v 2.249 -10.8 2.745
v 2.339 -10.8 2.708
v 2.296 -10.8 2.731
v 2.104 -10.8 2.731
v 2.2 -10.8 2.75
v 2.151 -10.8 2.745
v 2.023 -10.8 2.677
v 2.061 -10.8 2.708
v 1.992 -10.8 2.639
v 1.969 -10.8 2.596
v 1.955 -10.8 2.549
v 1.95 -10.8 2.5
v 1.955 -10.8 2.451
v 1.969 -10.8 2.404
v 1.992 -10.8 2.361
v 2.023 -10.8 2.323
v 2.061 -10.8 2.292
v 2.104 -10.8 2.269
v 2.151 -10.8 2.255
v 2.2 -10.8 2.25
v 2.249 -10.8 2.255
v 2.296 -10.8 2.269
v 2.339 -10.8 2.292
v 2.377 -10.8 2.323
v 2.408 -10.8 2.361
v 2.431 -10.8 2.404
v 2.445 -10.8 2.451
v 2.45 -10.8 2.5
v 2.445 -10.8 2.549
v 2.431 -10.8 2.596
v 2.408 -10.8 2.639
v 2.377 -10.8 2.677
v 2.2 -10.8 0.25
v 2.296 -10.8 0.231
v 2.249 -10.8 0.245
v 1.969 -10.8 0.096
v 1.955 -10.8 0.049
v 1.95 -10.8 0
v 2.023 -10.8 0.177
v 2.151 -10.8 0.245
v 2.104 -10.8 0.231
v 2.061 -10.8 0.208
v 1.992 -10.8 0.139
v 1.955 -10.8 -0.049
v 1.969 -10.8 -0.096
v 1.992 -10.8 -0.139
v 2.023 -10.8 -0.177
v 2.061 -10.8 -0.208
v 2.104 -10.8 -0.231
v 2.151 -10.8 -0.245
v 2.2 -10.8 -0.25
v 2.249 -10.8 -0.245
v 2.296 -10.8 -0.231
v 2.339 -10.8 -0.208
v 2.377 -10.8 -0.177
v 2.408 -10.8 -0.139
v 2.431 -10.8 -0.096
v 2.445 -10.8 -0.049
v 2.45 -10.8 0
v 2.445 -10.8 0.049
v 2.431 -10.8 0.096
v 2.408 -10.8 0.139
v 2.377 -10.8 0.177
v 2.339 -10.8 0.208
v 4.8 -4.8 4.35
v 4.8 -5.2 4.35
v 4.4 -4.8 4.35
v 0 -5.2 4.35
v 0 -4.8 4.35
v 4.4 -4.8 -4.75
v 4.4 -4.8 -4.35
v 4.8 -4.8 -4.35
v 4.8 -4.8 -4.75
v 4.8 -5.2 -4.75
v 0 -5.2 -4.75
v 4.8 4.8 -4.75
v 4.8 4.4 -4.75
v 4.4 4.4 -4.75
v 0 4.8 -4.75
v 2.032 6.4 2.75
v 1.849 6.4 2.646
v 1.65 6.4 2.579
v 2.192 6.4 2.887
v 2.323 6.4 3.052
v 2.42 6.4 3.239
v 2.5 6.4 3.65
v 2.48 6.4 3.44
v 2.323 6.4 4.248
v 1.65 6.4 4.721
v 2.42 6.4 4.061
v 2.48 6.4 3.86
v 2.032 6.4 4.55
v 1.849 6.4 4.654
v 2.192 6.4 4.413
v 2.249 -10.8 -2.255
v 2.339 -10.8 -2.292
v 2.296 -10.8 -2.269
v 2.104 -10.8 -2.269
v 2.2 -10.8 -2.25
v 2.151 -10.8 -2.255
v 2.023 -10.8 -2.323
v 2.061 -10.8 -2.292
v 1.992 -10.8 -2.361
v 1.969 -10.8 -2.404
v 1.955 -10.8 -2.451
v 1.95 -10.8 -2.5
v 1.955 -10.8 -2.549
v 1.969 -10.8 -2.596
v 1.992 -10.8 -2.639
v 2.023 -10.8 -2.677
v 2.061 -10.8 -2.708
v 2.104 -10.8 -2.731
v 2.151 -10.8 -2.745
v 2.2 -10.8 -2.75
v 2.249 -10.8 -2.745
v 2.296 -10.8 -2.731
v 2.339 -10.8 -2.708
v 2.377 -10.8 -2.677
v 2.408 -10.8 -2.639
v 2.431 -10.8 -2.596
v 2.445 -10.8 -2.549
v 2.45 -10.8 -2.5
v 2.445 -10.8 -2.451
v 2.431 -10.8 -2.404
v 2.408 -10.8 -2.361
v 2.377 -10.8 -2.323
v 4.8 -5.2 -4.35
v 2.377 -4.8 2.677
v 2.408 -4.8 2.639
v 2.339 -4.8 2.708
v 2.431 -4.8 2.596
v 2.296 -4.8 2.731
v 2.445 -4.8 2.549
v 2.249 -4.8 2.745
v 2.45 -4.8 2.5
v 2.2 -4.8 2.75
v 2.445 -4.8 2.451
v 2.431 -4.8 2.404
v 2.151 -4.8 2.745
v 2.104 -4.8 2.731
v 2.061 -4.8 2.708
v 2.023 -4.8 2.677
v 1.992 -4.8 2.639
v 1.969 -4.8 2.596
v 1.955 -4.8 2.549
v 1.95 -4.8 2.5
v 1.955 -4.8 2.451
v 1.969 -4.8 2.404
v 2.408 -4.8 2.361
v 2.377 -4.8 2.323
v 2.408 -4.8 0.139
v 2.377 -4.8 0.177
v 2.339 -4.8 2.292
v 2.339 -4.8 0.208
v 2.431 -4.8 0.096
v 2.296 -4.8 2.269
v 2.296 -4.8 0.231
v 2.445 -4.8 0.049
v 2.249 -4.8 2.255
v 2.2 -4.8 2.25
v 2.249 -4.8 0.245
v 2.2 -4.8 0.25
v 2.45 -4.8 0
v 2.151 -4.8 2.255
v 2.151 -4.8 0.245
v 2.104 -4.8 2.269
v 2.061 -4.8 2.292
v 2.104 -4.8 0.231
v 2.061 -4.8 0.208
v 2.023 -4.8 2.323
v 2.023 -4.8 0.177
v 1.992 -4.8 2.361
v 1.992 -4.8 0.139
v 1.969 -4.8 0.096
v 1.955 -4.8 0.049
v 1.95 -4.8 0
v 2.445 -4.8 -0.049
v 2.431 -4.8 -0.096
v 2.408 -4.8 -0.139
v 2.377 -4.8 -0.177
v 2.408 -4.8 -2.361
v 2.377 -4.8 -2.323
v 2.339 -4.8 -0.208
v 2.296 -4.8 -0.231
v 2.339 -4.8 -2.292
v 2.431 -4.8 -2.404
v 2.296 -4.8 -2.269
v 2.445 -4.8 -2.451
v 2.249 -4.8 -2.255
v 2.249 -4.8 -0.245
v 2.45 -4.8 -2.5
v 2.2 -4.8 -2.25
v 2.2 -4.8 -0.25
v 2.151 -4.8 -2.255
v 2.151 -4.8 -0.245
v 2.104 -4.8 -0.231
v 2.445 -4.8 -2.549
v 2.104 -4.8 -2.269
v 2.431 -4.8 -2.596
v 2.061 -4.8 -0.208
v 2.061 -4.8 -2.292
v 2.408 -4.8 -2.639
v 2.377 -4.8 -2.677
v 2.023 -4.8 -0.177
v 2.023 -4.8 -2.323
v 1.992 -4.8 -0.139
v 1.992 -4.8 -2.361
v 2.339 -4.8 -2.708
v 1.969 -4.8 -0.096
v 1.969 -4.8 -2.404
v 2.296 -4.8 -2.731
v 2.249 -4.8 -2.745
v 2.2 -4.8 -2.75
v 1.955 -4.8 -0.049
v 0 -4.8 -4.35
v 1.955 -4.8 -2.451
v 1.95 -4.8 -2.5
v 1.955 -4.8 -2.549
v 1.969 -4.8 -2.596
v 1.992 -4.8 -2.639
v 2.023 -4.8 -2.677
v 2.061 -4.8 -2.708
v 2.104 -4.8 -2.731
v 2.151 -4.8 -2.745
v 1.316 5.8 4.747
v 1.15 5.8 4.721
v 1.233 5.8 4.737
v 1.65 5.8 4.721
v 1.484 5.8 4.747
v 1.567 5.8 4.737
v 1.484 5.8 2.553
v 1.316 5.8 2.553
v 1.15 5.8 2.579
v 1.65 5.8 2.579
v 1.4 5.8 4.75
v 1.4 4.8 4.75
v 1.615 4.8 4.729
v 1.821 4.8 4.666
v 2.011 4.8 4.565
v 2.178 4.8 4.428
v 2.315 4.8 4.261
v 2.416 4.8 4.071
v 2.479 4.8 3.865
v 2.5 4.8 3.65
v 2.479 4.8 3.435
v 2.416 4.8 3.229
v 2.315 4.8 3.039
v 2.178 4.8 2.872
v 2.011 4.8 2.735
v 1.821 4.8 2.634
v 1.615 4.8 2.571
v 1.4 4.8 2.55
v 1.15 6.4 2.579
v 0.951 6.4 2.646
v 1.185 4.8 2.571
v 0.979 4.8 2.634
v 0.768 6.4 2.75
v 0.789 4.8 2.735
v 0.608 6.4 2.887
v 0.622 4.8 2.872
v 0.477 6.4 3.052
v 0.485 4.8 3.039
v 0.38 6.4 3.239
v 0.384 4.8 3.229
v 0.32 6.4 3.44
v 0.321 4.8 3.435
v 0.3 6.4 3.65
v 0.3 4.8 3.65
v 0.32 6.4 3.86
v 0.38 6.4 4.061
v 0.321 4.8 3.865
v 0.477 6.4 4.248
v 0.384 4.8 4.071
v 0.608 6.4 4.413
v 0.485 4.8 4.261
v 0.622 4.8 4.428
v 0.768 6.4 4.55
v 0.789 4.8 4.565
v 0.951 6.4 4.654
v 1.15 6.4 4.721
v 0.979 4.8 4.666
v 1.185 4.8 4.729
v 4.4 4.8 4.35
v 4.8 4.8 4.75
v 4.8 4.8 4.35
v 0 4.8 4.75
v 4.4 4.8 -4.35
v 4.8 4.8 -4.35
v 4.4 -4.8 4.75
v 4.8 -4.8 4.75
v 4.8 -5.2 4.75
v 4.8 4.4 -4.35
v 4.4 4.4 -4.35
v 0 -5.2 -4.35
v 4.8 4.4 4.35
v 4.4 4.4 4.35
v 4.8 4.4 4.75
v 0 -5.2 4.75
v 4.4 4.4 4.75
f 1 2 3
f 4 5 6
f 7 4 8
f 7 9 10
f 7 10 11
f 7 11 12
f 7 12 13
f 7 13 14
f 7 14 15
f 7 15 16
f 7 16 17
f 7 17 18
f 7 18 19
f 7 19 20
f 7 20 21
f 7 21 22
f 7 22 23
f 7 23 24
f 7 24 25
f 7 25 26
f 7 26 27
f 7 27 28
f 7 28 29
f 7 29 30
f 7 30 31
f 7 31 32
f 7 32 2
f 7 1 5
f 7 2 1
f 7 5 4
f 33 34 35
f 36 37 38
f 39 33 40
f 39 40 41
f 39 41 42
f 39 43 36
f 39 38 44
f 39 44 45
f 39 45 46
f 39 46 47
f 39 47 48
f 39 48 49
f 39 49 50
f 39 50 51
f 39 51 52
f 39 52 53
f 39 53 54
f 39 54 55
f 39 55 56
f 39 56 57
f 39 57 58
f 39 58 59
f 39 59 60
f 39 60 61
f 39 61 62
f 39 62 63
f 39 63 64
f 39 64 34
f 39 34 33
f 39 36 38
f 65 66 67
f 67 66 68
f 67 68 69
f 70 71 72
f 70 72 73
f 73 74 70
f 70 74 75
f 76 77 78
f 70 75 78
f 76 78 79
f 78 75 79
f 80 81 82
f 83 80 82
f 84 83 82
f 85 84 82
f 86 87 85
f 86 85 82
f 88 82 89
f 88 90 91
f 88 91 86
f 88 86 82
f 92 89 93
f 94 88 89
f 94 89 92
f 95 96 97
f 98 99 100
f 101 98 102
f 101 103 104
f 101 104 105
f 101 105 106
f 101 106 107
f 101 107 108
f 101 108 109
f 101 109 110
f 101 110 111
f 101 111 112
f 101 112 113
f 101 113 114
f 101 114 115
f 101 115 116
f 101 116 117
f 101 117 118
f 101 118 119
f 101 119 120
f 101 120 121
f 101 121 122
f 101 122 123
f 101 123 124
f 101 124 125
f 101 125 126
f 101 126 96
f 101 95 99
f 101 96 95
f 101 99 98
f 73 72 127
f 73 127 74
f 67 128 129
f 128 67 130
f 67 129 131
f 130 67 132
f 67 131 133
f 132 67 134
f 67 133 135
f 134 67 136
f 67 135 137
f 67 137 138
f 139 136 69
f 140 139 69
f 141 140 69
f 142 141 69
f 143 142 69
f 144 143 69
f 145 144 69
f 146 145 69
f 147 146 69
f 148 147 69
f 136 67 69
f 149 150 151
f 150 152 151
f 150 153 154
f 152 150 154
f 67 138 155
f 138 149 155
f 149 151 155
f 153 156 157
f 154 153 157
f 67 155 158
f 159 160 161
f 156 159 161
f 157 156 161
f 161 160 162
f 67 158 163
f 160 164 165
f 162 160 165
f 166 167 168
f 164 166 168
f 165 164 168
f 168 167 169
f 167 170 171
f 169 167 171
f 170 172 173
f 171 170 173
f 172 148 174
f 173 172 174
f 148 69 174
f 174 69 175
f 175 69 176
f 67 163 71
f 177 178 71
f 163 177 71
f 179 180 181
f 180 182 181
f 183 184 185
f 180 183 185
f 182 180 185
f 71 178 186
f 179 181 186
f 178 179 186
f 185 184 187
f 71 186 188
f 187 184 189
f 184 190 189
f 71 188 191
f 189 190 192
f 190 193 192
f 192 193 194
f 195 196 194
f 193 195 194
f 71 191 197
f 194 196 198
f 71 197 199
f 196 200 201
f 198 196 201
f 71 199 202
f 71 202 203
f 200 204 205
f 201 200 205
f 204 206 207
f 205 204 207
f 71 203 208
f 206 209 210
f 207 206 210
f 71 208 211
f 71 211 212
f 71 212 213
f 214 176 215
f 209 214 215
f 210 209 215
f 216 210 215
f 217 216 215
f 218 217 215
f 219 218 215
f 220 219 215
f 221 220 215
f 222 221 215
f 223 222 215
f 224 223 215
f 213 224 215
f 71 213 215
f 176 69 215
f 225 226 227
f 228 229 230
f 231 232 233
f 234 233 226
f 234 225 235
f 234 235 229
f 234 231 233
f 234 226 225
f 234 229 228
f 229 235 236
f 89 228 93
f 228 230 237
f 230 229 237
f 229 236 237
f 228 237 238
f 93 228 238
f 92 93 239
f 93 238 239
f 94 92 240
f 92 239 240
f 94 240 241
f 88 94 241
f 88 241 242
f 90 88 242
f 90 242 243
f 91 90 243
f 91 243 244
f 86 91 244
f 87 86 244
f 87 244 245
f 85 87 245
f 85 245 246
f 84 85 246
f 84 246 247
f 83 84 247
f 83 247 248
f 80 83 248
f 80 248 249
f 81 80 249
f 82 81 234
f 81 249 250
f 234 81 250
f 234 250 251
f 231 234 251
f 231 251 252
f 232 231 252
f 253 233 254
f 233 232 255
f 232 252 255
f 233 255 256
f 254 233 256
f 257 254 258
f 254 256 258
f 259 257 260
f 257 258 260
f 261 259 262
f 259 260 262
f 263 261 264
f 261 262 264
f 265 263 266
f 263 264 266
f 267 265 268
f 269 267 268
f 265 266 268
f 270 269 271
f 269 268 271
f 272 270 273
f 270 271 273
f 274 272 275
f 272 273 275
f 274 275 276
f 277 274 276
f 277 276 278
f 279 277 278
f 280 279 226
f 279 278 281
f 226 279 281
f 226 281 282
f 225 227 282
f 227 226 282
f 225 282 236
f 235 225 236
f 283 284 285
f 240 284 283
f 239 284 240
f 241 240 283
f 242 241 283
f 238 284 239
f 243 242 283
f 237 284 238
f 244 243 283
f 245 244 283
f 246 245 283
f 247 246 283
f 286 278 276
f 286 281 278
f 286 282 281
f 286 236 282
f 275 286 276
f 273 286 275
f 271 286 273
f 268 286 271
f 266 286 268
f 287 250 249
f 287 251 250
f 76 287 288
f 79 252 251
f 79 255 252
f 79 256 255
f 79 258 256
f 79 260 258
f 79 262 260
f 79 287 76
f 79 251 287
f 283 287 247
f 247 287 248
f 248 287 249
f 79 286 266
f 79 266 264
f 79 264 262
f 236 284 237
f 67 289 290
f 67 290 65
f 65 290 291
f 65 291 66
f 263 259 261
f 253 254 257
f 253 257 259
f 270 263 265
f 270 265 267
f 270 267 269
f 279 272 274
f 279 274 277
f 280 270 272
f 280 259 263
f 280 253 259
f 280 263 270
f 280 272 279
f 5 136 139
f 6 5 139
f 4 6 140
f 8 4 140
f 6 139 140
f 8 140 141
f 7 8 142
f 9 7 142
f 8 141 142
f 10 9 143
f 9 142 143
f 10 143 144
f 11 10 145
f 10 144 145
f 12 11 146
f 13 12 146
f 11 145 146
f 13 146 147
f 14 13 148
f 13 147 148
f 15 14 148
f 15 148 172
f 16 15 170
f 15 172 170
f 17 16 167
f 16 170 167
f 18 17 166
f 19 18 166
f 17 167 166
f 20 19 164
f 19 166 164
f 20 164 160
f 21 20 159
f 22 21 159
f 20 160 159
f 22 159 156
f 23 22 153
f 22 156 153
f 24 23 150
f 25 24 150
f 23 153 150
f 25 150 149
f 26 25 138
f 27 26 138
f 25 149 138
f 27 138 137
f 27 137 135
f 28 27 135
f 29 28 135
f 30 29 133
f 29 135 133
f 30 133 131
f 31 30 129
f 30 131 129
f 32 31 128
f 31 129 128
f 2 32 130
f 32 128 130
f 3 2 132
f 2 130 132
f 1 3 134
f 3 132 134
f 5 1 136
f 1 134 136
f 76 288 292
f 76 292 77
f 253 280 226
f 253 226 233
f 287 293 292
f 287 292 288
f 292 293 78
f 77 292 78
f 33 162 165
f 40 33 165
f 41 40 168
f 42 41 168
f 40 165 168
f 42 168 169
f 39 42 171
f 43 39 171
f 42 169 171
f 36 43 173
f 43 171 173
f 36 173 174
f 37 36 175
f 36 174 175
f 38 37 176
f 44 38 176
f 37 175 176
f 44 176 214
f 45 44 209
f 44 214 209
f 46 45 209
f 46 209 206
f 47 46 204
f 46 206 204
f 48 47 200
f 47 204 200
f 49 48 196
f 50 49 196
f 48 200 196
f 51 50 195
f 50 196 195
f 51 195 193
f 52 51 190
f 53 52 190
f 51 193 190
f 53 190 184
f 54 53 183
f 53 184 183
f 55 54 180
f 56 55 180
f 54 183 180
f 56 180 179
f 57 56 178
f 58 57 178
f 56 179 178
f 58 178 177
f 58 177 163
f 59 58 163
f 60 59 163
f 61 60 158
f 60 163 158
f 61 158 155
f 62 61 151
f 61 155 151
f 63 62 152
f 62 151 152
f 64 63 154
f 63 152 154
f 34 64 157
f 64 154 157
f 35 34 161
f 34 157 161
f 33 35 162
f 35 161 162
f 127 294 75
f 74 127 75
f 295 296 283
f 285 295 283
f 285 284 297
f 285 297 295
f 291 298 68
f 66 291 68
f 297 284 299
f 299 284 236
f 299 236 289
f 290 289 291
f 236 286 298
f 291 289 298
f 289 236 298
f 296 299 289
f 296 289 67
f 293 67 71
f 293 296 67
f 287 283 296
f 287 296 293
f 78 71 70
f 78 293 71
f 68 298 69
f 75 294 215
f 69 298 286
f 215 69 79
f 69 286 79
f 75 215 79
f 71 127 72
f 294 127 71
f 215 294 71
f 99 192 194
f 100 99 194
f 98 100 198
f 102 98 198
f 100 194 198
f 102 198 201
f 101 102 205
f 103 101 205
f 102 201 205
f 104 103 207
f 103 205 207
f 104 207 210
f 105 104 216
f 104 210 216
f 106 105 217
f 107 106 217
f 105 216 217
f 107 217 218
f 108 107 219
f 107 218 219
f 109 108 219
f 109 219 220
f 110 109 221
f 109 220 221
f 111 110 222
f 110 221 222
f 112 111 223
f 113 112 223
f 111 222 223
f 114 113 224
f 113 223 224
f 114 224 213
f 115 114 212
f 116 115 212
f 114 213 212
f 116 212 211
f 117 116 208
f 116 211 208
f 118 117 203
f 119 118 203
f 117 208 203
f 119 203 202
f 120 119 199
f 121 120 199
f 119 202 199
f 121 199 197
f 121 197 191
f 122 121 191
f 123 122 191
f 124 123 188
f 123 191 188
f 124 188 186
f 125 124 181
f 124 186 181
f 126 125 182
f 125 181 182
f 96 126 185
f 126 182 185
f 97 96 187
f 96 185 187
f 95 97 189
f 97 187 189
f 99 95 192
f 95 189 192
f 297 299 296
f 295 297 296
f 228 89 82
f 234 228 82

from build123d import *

# Parameters (mm, degrees)
EXTRUDE_1_DEPTH     = 4.4
SKETCH_1_4_W        = 0.4
SKETCH_1_4_H        = 0.4
EXTRUDE_2_DEPTH     = 4.8
SKETCH_2_R          = 1.1
EXTRUDE_3_DEPTH     = 1.6
CUT_EXTRUDE_START   = 1.6
SKETCH_2_5_W        = 0.5
SKETCH_2_5_H        = 2.2
CUT_EXTRUDE_2_DEPTH = 0.6
SKETCH_3_R          = 0.25
EXTRUDE_4_DEPTH     = 6


with BuildPart() as part:
    # 草图1 → 凸台-拉伸1 (new body)
    with BuildSketch(Plane(origin=(0, 0, 0), x_dir=(0, 0, -1), z_dir=(1, 0, 0))):
        Polygon((-4.75, 4.4), (-4.75, -4.8), (-4.35, -4.8), (4.35, -4.8), (4.75, -4.8), (4.75, 4.4), (4.35, 4.4), (4.35, 4.8), (-4.35, 4.8), (-4.35, 4.4), align=None)
    extrude(amount=EXTRUDE_1_DEPTH)

    # 草图1<4> → 凸台-拉伸2 (add)
    with BuildSketch(Plane(origin=(0, 0, 0), x_dir=(0, 0, -1), z_dir=(1, 0, 0))):
        with Locations((4.55, 4.6)):
            Rectangle(SKETCH_1_4_W, SKETCH_1_4_H)
        with Locations((4.55, -5)):
            Rectangle(SKETCH_1_4_W, SKETCH_1_4_H)
        with Locations((-4.55, 4.6)):
            Rectangle(SKETCH_1_4_W, SKETCH_1_4_H)
        with Locations((-4.55, -5)):
            Rectangle(SKETCH_1_4_W, SKETCH_1_4_H)
    extrude(amount=EXTRUDE_2_DEPTH)

    # 草图2 → 凸台-拉伸3 (add)
    with BuildSketch(Plane(origin=(0, 4.8, 0), x_dir=(1, 0, 0), z_dir=(0, 1, 0))):
        with Locations(Location((1.4, -3.65, 0), (0, 0, 270))):
            Circle(SKETCH_2_R)
    extrude(amount=EXTRUDE_3_DEPTH)

    # 草图2<5> → 切除-拉伸2 (cut)
    with BuildSketch(Plane(origin=(0, 4.8, 0), x_dir=(1, 0, 0), z_dir=(0, 1, 0)).offset(CUT_EXTRUDE_START)):
        with Locations((1.4, -3.65)):
            Rectangle(SKETCH_2_5_W, SKETCH_2_5_H)
    extrude(amount=-CUT_EXTRUDE_2_DEPTH, mode=Mode.SUBTRACT)

    # 草图3 → 凸台-拉伸4 (add)
    with BuildSketch(Plane.XZ.offset(4.8)):
        with Locations(Location((2.2, 0, 0), (0, 0, 90))):
            Circle(SKETCH_3_R)
        with Locations(Location((2.2, 2.5, 0), (0, 0, 90))):
            Circle(SKETCH_3_R)
        with Locations(Location((2.2, -2.5, 0), (0, 0, 90))):
            Circle(SKETCH_3_R)
    extrude(amount=EXTRUDE_4_DEPTH)


solid = part.part
